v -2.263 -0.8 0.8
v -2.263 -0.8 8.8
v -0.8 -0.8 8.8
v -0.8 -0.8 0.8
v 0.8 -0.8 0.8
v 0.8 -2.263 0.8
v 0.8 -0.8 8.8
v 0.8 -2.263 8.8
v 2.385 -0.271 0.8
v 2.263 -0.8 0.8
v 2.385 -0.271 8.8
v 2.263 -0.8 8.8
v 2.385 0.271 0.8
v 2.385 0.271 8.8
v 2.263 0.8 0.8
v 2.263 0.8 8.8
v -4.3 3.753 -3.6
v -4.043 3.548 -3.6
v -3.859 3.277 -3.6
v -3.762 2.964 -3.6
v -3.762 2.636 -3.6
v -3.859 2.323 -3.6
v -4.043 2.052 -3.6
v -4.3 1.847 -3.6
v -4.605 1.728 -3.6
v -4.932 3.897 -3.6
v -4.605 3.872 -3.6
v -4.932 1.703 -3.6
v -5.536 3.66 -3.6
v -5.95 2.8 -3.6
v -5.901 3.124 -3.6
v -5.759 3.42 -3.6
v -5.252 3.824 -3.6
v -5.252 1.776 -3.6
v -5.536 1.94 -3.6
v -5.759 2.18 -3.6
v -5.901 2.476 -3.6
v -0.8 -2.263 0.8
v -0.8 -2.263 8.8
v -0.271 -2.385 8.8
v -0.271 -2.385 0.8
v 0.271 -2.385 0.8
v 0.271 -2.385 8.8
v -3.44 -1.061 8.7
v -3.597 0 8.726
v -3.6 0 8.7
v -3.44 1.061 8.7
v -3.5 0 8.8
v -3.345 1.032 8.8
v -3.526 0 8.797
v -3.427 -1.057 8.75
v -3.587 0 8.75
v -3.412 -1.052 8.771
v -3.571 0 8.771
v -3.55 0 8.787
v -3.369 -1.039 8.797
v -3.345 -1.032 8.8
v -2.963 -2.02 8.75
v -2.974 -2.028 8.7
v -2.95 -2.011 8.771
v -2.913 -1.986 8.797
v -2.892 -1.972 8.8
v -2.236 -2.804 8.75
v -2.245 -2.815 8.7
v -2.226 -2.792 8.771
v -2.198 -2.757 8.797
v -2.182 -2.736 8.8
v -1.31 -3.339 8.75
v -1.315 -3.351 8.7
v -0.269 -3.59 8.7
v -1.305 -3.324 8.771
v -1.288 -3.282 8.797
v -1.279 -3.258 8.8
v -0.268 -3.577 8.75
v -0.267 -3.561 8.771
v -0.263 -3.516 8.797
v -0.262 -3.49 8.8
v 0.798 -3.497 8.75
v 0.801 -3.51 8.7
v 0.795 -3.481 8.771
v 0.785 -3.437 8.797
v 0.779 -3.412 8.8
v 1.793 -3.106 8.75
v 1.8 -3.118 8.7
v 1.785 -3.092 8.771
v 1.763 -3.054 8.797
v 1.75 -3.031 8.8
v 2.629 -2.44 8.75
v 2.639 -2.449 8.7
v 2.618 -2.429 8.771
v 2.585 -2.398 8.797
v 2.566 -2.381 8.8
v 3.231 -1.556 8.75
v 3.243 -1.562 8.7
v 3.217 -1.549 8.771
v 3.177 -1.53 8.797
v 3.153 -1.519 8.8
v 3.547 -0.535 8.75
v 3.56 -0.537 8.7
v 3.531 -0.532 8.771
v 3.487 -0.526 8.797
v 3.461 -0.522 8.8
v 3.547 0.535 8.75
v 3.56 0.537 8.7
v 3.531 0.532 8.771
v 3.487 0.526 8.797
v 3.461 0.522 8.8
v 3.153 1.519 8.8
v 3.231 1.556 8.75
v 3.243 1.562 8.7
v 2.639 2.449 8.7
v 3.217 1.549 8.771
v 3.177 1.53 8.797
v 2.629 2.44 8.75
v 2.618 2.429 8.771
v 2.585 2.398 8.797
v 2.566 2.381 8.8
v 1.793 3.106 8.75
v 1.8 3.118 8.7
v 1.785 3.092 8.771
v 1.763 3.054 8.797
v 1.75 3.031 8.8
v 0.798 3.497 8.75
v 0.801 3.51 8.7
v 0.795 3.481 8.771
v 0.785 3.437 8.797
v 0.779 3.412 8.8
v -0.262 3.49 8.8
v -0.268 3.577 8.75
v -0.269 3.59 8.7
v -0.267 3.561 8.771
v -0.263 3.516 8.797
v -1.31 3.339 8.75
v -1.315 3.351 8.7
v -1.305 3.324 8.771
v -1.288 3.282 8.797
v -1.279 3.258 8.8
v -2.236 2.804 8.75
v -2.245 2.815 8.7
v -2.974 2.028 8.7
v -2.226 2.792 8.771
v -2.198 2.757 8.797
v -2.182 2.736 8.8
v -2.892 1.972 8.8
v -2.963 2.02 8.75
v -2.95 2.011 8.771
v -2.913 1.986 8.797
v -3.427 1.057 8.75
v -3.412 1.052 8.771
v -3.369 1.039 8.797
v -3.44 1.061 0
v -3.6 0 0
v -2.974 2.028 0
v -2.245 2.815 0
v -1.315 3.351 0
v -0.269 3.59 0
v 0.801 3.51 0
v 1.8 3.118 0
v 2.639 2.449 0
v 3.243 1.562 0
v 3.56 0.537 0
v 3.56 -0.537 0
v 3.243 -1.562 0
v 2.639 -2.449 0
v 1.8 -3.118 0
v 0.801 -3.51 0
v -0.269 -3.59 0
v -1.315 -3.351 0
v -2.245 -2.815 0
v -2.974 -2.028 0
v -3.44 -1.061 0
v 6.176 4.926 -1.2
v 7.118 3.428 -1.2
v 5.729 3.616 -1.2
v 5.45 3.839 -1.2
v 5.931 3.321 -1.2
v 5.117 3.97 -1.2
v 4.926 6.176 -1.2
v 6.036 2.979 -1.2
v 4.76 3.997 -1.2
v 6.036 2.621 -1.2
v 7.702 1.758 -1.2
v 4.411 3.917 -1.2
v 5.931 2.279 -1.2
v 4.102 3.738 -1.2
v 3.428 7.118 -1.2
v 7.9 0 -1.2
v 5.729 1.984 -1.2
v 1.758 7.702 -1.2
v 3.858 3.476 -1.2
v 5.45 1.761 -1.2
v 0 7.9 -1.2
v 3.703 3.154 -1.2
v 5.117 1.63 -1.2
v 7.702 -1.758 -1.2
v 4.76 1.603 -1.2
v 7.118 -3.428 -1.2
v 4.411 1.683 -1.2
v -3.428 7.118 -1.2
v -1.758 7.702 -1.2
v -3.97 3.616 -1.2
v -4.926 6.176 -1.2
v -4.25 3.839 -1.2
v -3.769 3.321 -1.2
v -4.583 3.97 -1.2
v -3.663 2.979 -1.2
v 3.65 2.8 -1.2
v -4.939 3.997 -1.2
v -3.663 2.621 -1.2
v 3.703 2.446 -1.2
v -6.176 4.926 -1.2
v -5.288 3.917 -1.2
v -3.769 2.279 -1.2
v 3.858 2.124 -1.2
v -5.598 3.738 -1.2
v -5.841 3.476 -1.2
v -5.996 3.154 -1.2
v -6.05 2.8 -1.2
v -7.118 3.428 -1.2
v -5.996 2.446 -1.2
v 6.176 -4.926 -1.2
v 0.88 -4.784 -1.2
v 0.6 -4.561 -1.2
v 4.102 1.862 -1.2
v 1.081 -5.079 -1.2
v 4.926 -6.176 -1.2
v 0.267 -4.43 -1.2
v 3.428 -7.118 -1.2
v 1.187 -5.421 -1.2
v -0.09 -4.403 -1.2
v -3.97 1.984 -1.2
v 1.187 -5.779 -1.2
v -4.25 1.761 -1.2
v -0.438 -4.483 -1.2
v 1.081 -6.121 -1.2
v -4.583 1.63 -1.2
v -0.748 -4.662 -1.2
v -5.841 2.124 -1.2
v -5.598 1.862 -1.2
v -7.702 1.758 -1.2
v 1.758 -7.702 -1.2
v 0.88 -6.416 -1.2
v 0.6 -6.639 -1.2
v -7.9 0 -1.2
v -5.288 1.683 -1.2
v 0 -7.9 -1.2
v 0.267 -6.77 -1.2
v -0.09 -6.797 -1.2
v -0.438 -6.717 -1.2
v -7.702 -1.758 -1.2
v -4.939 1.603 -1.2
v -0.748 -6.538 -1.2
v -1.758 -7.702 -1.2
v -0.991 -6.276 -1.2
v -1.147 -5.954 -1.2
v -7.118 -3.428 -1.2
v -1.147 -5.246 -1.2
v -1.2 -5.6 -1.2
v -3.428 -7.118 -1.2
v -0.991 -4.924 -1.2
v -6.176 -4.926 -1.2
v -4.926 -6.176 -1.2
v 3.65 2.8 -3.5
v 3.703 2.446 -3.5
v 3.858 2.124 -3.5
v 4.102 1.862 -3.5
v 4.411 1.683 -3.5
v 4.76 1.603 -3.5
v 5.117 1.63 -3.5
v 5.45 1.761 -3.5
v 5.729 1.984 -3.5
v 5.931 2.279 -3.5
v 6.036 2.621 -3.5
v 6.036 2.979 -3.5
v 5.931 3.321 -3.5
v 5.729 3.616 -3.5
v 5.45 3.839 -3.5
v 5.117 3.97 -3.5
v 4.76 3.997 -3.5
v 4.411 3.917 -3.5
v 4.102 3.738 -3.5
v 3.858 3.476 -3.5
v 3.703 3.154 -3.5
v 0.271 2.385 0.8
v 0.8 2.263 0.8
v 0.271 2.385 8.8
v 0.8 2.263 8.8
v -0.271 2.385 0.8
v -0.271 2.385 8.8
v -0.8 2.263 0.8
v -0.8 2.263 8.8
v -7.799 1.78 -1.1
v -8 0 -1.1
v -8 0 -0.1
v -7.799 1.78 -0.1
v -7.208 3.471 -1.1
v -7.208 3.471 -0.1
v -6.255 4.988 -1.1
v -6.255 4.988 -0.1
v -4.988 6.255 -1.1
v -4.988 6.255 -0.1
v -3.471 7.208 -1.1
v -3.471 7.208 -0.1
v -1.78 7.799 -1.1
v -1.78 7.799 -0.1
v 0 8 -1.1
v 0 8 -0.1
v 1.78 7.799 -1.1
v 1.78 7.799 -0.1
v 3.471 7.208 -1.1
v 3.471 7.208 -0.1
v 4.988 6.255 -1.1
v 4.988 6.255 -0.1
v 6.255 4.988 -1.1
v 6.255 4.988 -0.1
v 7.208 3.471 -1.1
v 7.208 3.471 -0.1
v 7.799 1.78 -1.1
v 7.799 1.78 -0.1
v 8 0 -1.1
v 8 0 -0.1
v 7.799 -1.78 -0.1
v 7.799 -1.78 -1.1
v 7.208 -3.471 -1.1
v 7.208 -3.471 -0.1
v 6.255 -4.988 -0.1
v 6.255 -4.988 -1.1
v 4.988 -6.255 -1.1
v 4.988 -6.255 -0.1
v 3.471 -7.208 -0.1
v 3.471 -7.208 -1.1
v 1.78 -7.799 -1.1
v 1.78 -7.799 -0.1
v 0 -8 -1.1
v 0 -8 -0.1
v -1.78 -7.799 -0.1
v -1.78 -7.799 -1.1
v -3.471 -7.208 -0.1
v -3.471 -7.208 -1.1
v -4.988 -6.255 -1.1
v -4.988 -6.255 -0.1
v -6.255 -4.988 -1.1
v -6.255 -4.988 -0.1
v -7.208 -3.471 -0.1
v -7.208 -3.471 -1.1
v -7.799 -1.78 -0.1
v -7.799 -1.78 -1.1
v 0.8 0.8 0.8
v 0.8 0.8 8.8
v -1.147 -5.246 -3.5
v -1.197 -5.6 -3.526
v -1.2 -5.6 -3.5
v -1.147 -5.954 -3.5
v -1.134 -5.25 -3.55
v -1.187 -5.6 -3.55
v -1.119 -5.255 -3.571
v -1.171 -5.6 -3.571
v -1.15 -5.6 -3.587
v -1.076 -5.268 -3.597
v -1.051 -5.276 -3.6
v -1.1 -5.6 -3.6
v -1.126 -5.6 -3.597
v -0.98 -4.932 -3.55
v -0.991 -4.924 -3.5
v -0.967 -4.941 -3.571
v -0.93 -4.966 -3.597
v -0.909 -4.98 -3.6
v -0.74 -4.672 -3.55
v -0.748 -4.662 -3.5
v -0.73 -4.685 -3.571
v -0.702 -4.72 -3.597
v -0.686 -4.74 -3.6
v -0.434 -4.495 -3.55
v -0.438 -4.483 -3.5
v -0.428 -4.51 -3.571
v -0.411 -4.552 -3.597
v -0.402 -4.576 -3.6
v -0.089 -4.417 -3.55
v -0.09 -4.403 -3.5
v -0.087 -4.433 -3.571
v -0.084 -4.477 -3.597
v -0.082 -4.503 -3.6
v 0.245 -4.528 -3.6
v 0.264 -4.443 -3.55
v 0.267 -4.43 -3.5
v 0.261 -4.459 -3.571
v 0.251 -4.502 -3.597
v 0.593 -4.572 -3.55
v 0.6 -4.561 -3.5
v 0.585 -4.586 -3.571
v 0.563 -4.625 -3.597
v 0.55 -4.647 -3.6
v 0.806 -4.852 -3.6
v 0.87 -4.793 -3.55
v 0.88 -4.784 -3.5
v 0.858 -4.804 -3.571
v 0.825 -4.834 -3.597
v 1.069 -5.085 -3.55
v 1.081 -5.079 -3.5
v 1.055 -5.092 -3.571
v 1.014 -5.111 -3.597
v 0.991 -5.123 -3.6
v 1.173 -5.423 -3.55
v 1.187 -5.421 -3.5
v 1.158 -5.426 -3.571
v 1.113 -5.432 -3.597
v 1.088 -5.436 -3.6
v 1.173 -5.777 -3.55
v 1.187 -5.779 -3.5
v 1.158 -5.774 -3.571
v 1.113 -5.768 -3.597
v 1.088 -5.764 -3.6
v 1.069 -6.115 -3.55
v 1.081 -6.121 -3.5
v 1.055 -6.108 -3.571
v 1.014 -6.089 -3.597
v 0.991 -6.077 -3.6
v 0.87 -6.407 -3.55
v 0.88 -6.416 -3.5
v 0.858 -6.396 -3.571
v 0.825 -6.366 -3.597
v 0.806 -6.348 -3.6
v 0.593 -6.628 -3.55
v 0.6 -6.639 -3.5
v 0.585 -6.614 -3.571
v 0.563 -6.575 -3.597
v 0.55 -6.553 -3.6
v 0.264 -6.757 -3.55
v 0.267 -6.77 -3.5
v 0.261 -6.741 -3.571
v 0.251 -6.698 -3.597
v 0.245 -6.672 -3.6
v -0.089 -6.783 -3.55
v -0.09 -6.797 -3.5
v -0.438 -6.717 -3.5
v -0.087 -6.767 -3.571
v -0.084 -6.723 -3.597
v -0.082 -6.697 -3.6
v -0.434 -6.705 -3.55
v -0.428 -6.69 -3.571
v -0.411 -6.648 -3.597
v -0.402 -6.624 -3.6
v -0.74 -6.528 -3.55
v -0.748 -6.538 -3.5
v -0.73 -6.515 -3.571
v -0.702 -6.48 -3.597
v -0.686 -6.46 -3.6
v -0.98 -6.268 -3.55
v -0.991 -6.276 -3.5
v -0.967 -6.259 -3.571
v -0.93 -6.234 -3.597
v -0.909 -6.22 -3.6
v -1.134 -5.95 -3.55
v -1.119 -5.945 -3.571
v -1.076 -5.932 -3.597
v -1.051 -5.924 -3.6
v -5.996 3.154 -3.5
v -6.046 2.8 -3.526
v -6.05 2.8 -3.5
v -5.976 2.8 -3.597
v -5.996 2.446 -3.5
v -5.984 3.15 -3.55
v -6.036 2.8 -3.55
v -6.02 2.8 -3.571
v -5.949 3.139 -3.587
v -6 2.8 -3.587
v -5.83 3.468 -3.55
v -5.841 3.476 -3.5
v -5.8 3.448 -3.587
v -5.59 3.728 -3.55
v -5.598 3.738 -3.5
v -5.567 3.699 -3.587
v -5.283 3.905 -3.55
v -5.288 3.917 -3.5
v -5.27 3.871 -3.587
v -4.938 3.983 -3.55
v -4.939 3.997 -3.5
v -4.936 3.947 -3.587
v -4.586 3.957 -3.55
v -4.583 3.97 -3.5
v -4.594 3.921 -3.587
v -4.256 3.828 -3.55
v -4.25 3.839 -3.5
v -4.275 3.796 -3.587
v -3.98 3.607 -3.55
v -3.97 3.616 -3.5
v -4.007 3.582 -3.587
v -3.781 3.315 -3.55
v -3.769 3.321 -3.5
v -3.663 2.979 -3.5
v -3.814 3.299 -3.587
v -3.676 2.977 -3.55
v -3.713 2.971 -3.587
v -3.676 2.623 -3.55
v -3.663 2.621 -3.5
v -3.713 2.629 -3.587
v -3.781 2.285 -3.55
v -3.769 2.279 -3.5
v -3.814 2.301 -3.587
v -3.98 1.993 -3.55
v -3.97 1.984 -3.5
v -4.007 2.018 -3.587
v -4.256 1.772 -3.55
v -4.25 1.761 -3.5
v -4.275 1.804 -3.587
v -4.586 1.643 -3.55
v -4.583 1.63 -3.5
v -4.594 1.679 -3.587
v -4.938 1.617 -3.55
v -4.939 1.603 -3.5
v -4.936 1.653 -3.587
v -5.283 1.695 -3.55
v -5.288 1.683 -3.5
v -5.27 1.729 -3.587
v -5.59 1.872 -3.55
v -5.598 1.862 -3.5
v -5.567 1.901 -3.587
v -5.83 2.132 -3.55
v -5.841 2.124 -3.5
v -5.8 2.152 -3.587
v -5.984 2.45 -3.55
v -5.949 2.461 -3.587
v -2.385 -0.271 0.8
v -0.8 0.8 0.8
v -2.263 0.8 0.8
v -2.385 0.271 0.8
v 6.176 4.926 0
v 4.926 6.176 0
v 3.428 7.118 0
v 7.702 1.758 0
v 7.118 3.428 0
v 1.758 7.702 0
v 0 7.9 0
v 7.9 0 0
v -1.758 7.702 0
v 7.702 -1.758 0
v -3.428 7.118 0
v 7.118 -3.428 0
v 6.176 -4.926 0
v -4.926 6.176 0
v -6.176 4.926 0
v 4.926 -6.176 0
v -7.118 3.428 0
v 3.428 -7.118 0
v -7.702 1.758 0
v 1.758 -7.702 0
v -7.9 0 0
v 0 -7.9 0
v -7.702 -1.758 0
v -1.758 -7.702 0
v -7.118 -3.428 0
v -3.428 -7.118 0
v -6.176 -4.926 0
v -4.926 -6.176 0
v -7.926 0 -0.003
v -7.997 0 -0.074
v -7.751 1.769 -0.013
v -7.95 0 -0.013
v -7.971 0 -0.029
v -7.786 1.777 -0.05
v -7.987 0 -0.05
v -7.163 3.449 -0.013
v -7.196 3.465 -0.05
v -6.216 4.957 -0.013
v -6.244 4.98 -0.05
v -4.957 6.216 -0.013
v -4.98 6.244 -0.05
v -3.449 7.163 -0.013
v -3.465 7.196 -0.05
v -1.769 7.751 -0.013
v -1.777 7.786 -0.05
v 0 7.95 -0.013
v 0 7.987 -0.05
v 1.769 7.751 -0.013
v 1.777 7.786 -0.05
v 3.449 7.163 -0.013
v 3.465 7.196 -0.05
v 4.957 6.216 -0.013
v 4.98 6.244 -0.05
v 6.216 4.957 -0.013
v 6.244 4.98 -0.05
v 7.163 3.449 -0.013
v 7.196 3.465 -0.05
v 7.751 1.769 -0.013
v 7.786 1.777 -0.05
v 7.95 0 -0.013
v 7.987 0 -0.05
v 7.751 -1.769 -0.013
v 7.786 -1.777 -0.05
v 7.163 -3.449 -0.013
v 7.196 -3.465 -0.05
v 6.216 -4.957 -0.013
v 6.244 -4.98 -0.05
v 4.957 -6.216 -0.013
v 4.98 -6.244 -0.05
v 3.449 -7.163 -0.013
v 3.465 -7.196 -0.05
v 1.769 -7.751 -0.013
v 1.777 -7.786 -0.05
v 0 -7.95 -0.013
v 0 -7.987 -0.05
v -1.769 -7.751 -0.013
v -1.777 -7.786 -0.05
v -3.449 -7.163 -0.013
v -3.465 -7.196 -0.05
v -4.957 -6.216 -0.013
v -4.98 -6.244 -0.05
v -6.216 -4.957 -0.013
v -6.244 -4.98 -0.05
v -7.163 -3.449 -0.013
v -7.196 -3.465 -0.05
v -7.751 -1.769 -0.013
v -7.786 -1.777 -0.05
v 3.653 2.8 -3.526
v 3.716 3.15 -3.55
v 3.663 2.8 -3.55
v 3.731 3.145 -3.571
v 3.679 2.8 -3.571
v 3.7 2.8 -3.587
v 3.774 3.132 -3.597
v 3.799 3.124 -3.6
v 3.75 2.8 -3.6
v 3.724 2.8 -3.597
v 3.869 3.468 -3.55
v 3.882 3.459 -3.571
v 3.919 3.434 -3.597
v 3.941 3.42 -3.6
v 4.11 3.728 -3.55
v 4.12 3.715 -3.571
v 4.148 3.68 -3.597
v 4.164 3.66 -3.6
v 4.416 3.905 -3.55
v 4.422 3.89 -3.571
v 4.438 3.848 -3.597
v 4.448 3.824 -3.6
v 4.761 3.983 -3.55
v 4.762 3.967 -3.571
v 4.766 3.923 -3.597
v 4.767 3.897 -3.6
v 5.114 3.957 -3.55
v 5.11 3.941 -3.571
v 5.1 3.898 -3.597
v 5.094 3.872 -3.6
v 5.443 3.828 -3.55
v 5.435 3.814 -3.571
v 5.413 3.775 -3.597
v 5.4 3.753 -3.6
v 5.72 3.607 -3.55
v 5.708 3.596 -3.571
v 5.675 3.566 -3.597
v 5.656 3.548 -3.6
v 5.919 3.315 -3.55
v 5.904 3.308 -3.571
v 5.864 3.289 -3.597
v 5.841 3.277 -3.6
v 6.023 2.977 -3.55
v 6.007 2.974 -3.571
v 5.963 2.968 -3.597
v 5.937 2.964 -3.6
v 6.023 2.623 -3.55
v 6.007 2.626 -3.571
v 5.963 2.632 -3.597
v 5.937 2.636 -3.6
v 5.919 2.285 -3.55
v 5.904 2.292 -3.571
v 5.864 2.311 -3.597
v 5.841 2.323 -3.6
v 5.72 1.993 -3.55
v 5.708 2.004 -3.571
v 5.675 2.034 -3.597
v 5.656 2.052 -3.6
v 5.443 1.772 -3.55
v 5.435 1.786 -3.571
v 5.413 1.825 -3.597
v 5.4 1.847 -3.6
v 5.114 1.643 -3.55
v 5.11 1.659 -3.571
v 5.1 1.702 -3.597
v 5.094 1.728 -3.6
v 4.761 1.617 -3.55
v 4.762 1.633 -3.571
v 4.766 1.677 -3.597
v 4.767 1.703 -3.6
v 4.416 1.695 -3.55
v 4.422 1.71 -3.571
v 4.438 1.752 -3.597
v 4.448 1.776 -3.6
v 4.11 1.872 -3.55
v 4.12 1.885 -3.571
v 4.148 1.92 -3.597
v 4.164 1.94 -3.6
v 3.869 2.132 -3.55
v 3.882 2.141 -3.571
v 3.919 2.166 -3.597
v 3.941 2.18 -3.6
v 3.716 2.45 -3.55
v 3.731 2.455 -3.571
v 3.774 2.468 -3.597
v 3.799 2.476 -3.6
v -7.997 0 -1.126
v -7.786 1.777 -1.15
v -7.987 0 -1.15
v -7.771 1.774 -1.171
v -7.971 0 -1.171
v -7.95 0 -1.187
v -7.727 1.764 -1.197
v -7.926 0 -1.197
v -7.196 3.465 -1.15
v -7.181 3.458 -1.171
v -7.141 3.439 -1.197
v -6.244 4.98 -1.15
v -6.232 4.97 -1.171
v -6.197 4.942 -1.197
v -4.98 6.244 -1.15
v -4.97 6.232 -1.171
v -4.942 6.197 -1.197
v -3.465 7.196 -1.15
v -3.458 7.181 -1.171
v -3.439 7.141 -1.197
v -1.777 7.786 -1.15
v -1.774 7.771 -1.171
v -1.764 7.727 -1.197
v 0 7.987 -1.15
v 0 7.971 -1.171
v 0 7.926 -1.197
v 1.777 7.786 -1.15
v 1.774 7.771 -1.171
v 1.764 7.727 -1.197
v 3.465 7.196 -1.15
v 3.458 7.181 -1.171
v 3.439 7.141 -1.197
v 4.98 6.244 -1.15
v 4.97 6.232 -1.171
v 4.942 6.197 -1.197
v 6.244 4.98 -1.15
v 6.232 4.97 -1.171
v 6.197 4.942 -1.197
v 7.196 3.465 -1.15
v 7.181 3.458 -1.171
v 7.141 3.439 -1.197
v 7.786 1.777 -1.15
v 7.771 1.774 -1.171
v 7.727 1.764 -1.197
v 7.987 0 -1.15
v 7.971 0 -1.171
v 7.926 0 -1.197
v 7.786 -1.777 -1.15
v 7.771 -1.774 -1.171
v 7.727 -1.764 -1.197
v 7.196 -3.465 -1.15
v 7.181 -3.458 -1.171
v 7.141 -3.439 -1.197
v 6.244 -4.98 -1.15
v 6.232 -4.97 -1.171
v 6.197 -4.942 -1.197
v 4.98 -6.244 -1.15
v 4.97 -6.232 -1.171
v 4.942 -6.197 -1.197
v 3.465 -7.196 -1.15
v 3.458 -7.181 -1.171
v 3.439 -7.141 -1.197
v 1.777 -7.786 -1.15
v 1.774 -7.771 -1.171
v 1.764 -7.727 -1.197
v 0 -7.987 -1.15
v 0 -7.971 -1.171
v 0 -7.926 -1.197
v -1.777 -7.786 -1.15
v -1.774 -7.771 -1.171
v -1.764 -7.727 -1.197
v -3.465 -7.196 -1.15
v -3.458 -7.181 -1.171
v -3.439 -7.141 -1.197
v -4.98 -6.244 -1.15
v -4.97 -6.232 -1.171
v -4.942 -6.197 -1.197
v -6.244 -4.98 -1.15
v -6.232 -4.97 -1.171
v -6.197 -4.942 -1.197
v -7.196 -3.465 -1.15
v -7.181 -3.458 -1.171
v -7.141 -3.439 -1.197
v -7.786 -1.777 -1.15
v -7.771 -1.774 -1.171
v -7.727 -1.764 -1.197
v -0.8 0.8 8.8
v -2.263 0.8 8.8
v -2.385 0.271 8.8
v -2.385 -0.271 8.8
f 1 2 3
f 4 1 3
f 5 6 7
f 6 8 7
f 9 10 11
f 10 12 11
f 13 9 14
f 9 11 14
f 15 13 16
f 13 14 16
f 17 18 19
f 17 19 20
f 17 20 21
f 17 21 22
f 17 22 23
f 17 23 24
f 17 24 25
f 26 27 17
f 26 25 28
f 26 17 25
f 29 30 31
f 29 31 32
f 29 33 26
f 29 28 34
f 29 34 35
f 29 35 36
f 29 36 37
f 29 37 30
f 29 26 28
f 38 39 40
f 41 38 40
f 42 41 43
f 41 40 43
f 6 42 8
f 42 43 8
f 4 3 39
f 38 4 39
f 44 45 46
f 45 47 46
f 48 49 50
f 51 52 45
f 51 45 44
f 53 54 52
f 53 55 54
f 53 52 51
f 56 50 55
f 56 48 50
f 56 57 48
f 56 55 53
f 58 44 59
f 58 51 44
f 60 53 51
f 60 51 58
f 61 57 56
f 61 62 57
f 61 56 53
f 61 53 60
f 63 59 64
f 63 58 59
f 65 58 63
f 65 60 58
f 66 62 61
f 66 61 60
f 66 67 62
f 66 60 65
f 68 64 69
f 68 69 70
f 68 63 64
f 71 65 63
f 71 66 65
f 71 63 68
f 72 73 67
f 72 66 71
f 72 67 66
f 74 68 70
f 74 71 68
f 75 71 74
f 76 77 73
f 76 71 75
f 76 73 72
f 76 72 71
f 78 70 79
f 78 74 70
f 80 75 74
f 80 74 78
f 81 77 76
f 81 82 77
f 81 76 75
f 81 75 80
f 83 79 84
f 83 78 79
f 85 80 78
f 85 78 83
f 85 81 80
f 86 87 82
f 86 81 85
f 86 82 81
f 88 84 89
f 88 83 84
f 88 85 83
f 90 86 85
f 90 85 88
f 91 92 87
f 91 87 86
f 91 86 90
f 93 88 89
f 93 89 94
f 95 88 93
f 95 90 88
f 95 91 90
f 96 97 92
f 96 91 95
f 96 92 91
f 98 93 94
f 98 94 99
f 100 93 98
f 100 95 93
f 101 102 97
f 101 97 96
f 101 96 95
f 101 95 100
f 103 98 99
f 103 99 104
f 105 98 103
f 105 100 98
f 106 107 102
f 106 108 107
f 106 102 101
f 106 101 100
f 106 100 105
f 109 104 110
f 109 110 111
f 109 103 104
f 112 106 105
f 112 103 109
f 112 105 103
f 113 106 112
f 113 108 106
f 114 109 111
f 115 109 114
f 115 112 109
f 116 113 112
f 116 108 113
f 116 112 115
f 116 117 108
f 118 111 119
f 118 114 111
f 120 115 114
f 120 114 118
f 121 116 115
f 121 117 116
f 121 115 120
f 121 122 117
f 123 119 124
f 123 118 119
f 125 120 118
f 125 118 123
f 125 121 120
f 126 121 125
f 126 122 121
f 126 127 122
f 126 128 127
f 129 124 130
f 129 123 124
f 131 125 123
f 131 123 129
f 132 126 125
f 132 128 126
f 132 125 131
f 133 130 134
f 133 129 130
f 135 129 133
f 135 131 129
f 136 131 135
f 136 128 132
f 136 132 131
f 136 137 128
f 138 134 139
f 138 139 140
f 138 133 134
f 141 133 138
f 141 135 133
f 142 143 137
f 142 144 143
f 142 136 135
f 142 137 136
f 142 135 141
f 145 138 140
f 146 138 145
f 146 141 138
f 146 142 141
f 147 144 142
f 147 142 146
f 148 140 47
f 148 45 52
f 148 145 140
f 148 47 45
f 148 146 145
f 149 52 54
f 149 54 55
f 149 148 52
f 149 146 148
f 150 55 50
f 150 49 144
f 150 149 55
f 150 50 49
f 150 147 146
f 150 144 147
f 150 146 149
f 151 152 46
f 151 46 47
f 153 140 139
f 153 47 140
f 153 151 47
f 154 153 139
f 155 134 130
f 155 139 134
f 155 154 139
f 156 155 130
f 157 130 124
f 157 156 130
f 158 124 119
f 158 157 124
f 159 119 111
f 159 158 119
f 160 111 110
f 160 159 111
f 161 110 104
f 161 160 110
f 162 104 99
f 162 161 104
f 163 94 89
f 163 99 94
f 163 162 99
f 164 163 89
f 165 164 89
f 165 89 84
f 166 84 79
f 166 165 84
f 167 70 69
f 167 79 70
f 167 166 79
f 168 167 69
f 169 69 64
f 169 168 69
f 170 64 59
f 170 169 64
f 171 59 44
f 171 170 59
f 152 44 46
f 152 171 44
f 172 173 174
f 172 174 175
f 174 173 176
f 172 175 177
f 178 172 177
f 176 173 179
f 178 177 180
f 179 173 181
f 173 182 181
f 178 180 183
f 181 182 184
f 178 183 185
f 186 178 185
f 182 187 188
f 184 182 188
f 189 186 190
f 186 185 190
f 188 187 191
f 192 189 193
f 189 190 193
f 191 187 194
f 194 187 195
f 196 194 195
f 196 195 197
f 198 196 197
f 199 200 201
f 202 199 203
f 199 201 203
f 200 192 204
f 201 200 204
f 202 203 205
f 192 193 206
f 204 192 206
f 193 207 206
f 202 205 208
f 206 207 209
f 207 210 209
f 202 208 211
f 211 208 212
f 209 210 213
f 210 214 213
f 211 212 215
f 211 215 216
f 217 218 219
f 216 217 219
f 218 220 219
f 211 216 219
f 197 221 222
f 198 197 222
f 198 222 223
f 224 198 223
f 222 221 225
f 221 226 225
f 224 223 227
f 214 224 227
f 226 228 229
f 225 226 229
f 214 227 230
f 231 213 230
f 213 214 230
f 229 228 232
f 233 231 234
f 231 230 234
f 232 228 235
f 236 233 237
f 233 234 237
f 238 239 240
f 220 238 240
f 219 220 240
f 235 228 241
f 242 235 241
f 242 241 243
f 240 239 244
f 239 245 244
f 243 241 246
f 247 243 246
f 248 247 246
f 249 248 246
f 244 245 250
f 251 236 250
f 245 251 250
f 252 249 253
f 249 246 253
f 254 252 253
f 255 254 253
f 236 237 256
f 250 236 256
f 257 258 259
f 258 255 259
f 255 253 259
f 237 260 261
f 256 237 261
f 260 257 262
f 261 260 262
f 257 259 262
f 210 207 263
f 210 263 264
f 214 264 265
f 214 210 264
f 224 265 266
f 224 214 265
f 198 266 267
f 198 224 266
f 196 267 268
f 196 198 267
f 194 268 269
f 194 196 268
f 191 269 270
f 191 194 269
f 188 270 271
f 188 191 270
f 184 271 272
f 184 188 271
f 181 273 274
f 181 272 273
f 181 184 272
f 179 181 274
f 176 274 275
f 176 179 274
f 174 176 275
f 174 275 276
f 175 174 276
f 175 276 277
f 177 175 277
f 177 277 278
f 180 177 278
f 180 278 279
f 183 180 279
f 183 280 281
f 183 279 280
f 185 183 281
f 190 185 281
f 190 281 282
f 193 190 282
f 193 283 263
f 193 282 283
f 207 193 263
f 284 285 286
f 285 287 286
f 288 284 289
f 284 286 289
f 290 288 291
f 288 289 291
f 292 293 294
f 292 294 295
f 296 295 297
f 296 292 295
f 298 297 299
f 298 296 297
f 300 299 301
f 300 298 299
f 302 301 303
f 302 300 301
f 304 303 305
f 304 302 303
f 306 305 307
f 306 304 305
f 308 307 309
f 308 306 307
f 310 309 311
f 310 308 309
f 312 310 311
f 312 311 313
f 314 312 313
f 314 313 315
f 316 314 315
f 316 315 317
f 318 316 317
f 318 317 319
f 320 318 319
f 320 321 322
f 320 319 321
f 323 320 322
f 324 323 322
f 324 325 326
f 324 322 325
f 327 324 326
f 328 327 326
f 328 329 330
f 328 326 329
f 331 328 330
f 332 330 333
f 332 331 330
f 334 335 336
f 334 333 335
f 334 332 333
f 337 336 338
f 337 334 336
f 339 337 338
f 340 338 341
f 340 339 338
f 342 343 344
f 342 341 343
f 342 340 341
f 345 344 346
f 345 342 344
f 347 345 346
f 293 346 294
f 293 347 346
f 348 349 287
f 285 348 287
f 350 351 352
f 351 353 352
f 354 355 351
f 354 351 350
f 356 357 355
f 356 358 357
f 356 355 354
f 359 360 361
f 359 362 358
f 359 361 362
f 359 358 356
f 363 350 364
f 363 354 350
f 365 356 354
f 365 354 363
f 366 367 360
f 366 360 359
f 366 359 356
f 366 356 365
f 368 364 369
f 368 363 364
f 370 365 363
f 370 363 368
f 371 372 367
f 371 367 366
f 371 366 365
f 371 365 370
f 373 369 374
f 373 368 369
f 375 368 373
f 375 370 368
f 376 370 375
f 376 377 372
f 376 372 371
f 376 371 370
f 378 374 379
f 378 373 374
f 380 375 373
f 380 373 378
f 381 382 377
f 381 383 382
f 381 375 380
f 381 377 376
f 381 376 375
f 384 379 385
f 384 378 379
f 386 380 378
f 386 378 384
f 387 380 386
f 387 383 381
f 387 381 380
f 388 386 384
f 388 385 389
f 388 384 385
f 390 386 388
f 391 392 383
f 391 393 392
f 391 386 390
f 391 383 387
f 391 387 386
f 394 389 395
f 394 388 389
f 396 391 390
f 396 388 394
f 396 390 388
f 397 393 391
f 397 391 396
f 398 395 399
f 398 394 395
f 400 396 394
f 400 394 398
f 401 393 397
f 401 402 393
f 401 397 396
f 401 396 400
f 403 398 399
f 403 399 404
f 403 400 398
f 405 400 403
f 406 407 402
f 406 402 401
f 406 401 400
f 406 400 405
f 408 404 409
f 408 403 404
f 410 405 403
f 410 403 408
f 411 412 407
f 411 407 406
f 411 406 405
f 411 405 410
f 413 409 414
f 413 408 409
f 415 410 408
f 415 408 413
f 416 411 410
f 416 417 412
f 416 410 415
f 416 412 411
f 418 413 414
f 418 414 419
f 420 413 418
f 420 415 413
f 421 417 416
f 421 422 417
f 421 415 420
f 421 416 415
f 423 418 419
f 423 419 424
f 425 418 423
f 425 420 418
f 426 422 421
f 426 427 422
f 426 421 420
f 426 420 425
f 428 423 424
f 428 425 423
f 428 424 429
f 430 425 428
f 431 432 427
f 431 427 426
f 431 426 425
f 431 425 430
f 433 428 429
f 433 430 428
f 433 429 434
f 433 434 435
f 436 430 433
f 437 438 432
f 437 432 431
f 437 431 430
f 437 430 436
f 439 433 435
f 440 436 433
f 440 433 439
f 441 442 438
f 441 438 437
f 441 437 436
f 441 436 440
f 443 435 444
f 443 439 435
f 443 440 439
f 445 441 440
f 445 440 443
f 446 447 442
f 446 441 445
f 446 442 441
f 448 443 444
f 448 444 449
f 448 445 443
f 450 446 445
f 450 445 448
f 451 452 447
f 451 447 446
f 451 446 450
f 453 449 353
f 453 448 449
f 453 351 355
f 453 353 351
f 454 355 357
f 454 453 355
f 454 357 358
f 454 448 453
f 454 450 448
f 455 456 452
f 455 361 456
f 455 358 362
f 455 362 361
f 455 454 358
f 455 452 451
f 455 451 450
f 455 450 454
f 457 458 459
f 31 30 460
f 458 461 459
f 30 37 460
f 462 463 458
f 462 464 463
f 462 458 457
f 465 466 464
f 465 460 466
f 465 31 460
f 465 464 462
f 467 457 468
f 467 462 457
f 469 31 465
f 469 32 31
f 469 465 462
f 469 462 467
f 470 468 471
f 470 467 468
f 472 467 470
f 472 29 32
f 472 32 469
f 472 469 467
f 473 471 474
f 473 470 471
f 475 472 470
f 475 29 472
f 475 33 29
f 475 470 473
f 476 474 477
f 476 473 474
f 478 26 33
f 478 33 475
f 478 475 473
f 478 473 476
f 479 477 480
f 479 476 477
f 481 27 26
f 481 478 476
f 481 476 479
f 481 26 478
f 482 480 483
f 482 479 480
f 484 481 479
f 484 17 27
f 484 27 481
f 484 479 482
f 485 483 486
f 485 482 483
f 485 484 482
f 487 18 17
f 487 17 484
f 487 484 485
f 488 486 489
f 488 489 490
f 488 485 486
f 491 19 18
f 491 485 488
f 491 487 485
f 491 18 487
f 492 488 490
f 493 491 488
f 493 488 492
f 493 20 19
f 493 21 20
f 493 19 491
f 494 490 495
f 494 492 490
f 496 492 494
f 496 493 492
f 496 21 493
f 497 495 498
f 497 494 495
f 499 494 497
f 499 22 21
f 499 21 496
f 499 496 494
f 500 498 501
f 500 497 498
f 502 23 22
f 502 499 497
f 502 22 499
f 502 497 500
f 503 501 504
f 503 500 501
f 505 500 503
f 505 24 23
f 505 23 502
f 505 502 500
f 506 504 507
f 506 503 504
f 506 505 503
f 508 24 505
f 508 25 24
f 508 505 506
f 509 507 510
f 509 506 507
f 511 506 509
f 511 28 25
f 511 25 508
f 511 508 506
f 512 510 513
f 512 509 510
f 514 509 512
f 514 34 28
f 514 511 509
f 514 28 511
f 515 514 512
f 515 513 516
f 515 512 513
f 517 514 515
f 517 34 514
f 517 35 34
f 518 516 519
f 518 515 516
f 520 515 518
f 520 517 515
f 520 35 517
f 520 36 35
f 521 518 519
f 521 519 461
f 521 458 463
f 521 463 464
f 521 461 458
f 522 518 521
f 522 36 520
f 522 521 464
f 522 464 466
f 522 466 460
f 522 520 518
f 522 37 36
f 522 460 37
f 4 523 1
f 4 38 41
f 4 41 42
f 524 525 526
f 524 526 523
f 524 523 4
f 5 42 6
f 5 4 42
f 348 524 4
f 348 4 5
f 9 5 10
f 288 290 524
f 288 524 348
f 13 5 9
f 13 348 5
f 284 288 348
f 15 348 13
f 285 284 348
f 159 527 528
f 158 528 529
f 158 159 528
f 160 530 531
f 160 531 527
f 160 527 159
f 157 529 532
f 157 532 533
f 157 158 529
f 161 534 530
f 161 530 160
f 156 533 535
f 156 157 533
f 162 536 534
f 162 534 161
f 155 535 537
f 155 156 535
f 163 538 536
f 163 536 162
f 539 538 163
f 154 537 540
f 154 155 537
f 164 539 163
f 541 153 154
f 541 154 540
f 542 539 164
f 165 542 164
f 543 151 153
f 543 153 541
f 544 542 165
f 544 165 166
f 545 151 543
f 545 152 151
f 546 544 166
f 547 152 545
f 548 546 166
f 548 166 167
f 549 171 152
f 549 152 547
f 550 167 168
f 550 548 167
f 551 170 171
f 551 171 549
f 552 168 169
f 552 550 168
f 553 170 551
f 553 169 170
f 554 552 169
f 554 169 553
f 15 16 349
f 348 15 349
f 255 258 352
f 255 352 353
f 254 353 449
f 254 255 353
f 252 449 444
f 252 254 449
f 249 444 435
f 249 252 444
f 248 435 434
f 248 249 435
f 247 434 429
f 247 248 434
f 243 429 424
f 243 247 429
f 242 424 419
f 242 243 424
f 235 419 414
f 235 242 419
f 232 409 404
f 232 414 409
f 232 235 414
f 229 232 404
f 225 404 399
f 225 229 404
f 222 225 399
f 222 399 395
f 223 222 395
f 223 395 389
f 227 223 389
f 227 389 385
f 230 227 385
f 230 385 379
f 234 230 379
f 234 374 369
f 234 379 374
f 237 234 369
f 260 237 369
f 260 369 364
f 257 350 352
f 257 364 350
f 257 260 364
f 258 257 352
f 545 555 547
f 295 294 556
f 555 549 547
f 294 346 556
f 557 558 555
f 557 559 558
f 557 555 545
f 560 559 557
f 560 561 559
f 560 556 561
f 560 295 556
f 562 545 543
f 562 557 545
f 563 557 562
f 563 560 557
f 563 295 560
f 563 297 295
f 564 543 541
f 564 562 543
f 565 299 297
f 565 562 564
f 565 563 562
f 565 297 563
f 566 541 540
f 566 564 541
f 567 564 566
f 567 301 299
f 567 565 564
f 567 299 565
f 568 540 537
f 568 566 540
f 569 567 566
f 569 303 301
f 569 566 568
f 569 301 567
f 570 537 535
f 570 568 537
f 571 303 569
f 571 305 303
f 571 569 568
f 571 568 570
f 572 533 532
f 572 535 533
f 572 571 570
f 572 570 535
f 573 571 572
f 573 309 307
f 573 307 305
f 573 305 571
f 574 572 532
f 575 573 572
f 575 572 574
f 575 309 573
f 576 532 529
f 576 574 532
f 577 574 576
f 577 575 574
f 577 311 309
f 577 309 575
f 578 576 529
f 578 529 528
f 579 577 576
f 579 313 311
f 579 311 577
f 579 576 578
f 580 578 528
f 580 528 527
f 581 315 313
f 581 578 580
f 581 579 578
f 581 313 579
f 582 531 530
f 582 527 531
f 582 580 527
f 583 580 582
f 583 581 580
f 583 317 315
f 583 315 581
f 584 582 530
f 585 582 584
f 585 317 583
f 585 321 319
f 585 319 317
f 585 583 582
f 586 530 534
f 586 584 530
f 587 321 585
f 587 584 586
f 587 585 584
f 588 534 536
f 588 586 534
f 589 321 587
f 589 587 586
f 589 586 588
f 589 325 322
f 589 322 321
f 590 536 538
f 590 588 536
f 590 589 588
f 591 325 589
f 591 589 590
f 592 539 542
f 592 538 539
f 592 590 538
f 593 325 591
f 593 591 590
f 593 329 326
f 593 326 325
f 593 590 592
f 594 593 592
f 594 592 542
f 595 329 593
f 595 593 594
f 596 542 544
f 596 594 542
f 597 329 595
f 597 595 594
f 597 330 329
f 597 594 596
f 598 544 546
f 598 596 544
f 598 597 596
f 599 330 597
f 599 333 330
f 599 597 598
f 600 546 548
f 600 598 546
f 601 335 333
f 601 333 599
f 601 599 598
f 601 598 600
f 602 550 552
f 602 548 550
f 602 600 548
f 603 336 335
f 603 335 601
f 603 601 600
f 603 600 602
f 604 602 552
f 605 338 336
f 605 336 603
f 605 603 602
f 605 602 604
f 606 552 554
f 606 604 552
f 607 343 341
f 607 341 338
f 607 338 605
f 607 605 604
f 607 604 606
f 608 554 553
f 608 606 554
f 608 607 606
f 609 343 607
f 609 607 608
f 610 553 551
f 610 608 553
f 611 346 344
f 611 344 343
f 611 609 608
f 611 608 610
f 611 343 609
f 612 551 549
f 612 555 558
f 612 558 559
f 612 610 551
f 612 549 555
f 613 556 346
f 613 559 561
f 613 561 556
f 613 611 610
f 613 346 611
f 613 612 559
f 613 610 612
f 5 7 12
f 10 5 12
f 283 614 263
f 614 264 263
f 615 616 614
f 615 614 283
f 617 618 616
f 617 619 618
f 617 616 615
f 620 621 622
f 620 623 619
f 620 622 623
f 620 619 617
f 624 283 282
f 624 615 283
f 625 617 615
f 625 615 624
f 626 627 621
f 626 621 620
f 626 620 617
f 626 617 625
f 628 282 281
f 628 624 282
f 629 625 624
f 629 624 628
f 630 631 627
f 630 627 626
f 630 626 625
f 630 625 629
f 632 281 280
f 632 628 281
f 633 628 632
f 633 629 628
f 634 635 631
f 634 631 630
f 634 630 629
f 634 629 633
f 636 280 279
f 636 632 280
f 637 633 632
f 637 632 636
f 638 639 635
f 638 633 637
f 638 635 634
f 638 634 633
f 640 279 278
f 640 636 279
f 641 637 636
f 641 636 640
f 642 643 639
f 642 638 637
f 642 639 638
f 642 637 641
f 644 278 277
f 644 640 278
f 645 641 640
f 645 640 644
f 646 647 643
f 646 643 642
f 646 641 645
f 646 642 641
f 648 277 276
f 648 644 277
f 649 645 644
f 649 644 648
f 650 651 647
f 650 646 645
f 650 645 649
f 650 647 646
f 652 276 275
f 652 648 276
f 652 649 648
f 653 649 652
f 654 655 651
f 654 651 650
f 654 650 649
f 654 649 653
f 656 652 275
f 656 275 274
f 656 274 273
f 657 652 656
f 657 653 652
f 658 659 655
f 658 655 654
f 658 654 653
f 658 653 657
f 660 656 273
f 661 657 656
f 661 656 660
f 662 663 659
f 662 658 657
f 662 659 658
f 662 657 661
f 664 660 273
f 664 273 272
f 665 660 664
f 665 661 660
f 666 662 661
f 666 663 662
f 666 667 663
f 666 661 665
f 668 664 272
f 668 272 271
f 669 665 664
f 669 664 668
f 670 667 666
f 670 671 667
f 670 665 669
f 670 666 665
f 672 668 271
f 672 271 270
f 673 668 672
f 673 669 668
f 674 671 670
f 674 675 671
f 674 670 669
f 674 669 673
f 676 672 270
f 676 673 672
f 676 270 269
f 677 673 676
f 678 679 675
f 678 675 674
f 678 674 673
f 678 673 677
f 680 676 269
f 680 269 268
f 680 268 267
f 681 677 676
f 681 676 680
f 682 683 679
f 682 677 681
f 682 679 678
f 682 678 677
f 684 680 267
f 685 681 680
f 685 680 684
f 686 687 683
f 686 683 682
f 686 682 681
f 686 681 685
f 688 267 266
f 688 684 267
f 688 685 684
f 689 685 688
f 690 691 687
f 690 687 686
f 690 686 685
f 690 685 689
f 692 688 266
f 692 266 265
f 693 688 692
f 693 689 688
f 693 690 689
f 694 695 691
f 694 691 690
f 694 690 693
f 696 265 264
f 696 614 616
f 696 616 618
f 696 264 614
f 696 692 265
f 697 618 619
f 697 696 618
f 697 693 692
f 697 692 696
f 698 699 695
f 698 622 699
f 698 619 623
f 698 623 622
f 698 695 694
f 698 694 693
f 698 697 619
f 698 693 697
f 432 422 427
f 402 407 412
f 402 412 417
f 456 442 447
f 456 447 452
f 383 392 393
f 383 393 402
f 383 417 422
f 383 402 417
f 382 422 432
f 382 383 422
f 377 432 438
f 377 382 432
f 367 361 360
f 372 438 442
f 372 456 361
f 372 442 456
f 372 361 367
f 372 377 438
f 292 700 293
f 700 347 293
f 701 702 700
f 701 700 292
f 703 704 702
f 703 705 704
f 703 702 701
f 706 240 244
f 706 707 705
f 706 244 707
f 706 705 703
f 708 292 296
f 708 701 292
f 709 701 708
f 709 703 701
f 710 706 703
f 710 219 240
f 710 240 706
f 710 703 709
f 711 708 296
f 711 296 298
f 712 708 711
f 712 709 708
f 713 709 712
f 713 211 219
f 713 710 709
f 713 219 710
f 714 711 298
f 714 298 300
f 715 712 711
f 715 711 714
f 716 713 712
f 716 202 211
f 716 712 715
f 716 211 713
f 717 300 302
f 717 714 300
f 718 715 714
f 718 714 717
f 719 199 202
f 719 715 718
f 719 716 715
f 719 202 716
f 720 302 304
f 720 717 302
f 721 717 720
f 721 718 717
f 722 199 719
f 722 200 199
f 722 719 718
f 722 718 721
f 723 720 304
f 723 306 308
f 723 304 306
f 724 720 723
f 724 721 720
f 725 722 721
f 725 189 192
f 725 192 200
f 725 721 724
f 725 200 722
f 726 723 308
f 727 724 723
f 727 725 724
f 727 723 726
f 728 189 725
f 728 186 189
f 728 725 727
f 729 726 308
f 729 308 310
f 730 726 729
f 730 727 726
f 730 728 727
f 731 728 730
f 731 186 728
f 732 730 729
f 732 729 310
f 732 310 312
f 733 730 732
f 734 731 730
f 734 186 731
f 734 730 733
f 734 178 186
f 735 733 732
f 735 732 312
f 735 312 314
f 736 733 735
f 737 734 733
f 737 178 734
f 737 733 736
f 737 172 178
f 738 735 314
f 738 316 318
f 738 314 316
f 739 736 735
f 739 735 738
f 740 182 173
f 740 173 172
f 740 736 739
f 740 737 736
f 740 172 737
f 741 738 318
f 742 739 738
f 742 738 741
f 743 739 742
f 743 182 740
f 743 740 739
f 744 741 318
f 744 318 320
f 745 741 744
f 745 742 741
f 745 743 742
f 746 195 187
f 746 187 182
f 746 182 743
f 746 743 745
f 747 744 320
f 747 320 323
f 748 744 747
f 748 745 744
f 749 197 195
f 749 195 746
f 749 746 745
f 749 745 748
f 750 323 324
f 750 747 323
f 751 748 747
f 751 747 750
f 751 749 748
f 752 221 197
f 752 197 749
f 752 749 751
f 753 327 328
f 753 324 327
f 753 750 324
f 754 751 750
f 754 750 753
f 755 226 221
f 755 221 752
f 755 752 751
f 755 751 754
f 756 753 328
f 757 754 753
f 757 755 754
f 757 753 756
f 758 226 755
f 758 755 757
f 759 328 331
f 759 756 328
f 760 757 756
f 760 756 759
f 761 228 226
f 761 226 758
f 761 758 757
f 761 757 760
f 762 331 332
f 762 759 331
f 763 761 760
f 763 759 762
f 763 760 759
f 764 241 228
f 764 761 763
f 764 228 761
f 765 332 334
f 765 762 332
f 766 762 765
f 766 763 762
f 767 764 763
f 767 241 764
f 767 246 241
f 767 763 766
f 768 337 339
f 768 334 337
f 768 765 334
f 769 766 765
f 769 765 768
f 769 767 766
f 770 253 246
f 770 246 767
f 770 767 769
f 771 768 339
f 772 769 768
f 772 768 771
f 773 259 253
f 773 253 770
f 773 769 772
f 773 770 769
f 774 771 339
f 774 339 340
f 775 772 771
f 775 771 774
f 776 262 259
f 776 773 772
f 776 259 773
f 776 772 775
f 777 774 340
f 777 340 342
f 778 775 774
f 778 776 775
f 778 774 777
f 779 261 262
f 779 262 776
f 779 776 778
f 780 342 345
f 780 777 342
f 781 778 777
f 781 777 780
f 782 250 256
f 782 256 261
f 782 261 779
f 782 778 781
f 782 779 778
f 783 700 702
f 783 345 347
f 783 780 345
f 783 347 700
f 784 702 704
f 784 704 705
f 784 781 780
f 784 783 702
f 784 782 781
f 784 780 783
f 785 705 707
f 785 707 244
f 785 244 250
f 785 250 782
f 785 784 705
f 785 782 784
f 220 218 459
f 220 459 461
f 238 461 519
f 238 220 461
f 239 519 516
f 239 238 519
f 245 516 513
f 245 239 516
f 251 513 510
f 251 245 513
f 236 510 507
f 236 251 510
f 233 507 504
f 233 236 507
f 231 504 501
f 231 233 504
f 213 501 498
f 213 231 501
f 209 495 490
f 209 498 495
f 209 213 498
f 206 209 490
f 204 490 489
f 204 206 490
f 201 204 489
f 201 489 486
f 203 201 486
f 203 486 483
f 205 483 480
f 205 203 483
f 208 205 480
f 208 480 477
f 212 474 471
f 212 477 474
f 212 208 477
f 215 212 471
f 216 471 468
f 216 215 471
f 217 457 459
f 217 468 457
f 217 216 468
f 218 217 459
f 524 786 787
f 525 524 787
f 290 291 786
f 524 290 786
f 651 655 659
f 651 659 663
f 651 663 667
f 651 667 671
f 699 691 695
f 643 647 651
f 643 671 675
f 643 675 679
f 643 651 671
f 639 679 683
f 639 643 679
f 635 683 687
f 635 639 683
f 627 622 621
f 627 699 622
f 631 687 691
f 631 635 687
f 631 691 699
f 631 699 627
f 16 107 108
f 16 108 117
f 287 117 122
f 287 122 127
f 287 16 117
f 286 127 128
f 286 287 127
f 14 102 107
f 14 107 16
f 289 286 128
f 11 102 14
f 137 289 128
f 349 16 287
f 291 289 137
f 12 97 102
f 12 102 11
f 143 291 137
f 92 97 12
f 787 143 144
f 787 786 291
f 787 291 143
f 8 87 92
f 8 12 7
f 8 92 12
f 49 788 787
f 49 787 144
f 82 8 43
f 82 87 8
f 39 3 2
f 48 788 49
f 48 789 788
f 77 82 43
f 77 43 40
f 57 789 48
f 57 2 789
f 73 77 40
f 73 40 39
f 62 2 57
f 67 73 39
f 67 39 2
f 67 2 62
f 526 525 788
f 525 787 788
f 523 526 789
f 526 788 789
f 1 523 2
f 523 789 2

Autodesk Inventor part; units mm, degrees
ref_plane "YZ Plane" through (0, 0, 0) normal (1, 0, 0) x (0, 1, 0)
ref_plane "XZ Plane" through (0, 0, 0) normal (0, 1, 0) x (-1, 0, 0)
ref_plane "XY Plane" through (0, 0, 0) normal (0, 0, 1) x (1, 0, 0)
sketch "Sketch2" plane through (0, 0, 0) normal (0, 1, 0) x (-1, 0, 0)
  line L0 (3.6, 0) -> (8, 0)
  line L1 (8, 0) -> (8, -1.2)
  line L2 (8, -1.2) -> (0, -1.2)
  line L3 (0, -1.2) -> (0, 8.8)
  line L4 (0, 8.8) -> (3.6, 8.8)
  line L5 (3.6, 8.8) -> (3.6, 0)
  point P0 (0, 0)
  dimension "d0" = 7.2
  dimension "d1" = 16
  dimension "d2" = 1.2
  dimension "d3" = 8.8
revolve "Revolution1" add sketch "Sketch2" angle 360 about axis through (0, 0, -1.2) along (0, 0, 1)
sketch "Sketch3" plane through (0, 0, 8.8) normal (0, 0, 1) x (1, 0, 0)
  circle A0 centre (0, 0) radius 3.6 projected
  circle A1 centre (0, 0) radius 2.4 construction
  line L0 (-0.8, 2.2627) -> (-0.8, 0.8)
  line L1 (-0.8, 0.8) -> (-2.2627, 0.8)
  line L2 (-2.2627, -0.8) -> (-0.8, -0.8)
  line L3 (-0.8, -0.8) -> (-0.8, -2.2627)
  line L4 (0.8, -2.2627) -> (0.8, -0.8)
  line L5 (0.8, -0.8) -> (2.2627, -0.8)
  line L6 (2.2627, 0.8) -> (0.8, 0.8)
  line L7 (0.8, 0.8) -> (0.8, 2.2627)
  arc A2 (0.8, 2.2627) -> (-0.8, 2.2627) centre (0, 0) ccw
  arc A3 (-2.2627, 0.8) -> (-2.2627, -0.8) centre (0, 0) ccw
  arc A4 (-0.8, -2.2627) -> (0.8, -2.2627) centre (0, 0) ccw
  arc A5 (2.2627, -0.8) -> (2.2627, 0.8) centre (0, 0) ccw
  dimension "d5" = 4.8
  dimension "d6" = 1.6
extrude "Extrusion1" cut sketch "Sketch3" against normal blind 8 contours A2 L7 L6 A5 L5 L4 A4 L3 L2 A3 L1 L0
sketch "Sketch4" plane through (0, 0, -1.2) normal (0, 0, -1) x (-1, 0, 0)
  circle A0 centre (0, 0) radius 8 projected
  circle A1 centre (-4.8497, 2.8) radius 1.2
  circle A2 centre (4.8497, 2.8) radius 1.2
  circle A3 centre (0, -5.6) radius 1.2
  circle A4 centre (0, 0) radius 5.6 construction
  line L0 (-4.8497, 2.8) -> (0, 0) construction
  line L1 (0, 0) -> (4.8497, 2.8) construction
  dimension "d9" = 120
  dimension "d10" = 2.4
  dimension "d11" = 11.2
extrude "Extrusion2" add sketch "Sketch4" along normal blind 2.4 contours A1 | A2 | A3
fillet "Fillet1" radius 0.1 6 edges at (3.6, 0, 8.8) (8, 0, 0) (8, 0, -1.2) (6.0497, 2.8, -3.6) (-3.6497, 2.8, -3.6) (1.2, -5.6, -3.6)
equation "\"d0\" = tlad"
equation "\"d1\" = 2 * lu"
equation "\"d5\" = tpd"
equation "\"d6\" = axlet"
equation "\"d7\" = lu"
equation "\"d14\" = lf"
equation "\"tlad\" = 7.2"
equation "\"lu\" = 8"
equation "\"tpd\" = 4.8"
equation "\"axlet\" = 1.6"
equation "\"lf\" = 0.1"
properties part number "99543-Red" material "ABS Plastic"
